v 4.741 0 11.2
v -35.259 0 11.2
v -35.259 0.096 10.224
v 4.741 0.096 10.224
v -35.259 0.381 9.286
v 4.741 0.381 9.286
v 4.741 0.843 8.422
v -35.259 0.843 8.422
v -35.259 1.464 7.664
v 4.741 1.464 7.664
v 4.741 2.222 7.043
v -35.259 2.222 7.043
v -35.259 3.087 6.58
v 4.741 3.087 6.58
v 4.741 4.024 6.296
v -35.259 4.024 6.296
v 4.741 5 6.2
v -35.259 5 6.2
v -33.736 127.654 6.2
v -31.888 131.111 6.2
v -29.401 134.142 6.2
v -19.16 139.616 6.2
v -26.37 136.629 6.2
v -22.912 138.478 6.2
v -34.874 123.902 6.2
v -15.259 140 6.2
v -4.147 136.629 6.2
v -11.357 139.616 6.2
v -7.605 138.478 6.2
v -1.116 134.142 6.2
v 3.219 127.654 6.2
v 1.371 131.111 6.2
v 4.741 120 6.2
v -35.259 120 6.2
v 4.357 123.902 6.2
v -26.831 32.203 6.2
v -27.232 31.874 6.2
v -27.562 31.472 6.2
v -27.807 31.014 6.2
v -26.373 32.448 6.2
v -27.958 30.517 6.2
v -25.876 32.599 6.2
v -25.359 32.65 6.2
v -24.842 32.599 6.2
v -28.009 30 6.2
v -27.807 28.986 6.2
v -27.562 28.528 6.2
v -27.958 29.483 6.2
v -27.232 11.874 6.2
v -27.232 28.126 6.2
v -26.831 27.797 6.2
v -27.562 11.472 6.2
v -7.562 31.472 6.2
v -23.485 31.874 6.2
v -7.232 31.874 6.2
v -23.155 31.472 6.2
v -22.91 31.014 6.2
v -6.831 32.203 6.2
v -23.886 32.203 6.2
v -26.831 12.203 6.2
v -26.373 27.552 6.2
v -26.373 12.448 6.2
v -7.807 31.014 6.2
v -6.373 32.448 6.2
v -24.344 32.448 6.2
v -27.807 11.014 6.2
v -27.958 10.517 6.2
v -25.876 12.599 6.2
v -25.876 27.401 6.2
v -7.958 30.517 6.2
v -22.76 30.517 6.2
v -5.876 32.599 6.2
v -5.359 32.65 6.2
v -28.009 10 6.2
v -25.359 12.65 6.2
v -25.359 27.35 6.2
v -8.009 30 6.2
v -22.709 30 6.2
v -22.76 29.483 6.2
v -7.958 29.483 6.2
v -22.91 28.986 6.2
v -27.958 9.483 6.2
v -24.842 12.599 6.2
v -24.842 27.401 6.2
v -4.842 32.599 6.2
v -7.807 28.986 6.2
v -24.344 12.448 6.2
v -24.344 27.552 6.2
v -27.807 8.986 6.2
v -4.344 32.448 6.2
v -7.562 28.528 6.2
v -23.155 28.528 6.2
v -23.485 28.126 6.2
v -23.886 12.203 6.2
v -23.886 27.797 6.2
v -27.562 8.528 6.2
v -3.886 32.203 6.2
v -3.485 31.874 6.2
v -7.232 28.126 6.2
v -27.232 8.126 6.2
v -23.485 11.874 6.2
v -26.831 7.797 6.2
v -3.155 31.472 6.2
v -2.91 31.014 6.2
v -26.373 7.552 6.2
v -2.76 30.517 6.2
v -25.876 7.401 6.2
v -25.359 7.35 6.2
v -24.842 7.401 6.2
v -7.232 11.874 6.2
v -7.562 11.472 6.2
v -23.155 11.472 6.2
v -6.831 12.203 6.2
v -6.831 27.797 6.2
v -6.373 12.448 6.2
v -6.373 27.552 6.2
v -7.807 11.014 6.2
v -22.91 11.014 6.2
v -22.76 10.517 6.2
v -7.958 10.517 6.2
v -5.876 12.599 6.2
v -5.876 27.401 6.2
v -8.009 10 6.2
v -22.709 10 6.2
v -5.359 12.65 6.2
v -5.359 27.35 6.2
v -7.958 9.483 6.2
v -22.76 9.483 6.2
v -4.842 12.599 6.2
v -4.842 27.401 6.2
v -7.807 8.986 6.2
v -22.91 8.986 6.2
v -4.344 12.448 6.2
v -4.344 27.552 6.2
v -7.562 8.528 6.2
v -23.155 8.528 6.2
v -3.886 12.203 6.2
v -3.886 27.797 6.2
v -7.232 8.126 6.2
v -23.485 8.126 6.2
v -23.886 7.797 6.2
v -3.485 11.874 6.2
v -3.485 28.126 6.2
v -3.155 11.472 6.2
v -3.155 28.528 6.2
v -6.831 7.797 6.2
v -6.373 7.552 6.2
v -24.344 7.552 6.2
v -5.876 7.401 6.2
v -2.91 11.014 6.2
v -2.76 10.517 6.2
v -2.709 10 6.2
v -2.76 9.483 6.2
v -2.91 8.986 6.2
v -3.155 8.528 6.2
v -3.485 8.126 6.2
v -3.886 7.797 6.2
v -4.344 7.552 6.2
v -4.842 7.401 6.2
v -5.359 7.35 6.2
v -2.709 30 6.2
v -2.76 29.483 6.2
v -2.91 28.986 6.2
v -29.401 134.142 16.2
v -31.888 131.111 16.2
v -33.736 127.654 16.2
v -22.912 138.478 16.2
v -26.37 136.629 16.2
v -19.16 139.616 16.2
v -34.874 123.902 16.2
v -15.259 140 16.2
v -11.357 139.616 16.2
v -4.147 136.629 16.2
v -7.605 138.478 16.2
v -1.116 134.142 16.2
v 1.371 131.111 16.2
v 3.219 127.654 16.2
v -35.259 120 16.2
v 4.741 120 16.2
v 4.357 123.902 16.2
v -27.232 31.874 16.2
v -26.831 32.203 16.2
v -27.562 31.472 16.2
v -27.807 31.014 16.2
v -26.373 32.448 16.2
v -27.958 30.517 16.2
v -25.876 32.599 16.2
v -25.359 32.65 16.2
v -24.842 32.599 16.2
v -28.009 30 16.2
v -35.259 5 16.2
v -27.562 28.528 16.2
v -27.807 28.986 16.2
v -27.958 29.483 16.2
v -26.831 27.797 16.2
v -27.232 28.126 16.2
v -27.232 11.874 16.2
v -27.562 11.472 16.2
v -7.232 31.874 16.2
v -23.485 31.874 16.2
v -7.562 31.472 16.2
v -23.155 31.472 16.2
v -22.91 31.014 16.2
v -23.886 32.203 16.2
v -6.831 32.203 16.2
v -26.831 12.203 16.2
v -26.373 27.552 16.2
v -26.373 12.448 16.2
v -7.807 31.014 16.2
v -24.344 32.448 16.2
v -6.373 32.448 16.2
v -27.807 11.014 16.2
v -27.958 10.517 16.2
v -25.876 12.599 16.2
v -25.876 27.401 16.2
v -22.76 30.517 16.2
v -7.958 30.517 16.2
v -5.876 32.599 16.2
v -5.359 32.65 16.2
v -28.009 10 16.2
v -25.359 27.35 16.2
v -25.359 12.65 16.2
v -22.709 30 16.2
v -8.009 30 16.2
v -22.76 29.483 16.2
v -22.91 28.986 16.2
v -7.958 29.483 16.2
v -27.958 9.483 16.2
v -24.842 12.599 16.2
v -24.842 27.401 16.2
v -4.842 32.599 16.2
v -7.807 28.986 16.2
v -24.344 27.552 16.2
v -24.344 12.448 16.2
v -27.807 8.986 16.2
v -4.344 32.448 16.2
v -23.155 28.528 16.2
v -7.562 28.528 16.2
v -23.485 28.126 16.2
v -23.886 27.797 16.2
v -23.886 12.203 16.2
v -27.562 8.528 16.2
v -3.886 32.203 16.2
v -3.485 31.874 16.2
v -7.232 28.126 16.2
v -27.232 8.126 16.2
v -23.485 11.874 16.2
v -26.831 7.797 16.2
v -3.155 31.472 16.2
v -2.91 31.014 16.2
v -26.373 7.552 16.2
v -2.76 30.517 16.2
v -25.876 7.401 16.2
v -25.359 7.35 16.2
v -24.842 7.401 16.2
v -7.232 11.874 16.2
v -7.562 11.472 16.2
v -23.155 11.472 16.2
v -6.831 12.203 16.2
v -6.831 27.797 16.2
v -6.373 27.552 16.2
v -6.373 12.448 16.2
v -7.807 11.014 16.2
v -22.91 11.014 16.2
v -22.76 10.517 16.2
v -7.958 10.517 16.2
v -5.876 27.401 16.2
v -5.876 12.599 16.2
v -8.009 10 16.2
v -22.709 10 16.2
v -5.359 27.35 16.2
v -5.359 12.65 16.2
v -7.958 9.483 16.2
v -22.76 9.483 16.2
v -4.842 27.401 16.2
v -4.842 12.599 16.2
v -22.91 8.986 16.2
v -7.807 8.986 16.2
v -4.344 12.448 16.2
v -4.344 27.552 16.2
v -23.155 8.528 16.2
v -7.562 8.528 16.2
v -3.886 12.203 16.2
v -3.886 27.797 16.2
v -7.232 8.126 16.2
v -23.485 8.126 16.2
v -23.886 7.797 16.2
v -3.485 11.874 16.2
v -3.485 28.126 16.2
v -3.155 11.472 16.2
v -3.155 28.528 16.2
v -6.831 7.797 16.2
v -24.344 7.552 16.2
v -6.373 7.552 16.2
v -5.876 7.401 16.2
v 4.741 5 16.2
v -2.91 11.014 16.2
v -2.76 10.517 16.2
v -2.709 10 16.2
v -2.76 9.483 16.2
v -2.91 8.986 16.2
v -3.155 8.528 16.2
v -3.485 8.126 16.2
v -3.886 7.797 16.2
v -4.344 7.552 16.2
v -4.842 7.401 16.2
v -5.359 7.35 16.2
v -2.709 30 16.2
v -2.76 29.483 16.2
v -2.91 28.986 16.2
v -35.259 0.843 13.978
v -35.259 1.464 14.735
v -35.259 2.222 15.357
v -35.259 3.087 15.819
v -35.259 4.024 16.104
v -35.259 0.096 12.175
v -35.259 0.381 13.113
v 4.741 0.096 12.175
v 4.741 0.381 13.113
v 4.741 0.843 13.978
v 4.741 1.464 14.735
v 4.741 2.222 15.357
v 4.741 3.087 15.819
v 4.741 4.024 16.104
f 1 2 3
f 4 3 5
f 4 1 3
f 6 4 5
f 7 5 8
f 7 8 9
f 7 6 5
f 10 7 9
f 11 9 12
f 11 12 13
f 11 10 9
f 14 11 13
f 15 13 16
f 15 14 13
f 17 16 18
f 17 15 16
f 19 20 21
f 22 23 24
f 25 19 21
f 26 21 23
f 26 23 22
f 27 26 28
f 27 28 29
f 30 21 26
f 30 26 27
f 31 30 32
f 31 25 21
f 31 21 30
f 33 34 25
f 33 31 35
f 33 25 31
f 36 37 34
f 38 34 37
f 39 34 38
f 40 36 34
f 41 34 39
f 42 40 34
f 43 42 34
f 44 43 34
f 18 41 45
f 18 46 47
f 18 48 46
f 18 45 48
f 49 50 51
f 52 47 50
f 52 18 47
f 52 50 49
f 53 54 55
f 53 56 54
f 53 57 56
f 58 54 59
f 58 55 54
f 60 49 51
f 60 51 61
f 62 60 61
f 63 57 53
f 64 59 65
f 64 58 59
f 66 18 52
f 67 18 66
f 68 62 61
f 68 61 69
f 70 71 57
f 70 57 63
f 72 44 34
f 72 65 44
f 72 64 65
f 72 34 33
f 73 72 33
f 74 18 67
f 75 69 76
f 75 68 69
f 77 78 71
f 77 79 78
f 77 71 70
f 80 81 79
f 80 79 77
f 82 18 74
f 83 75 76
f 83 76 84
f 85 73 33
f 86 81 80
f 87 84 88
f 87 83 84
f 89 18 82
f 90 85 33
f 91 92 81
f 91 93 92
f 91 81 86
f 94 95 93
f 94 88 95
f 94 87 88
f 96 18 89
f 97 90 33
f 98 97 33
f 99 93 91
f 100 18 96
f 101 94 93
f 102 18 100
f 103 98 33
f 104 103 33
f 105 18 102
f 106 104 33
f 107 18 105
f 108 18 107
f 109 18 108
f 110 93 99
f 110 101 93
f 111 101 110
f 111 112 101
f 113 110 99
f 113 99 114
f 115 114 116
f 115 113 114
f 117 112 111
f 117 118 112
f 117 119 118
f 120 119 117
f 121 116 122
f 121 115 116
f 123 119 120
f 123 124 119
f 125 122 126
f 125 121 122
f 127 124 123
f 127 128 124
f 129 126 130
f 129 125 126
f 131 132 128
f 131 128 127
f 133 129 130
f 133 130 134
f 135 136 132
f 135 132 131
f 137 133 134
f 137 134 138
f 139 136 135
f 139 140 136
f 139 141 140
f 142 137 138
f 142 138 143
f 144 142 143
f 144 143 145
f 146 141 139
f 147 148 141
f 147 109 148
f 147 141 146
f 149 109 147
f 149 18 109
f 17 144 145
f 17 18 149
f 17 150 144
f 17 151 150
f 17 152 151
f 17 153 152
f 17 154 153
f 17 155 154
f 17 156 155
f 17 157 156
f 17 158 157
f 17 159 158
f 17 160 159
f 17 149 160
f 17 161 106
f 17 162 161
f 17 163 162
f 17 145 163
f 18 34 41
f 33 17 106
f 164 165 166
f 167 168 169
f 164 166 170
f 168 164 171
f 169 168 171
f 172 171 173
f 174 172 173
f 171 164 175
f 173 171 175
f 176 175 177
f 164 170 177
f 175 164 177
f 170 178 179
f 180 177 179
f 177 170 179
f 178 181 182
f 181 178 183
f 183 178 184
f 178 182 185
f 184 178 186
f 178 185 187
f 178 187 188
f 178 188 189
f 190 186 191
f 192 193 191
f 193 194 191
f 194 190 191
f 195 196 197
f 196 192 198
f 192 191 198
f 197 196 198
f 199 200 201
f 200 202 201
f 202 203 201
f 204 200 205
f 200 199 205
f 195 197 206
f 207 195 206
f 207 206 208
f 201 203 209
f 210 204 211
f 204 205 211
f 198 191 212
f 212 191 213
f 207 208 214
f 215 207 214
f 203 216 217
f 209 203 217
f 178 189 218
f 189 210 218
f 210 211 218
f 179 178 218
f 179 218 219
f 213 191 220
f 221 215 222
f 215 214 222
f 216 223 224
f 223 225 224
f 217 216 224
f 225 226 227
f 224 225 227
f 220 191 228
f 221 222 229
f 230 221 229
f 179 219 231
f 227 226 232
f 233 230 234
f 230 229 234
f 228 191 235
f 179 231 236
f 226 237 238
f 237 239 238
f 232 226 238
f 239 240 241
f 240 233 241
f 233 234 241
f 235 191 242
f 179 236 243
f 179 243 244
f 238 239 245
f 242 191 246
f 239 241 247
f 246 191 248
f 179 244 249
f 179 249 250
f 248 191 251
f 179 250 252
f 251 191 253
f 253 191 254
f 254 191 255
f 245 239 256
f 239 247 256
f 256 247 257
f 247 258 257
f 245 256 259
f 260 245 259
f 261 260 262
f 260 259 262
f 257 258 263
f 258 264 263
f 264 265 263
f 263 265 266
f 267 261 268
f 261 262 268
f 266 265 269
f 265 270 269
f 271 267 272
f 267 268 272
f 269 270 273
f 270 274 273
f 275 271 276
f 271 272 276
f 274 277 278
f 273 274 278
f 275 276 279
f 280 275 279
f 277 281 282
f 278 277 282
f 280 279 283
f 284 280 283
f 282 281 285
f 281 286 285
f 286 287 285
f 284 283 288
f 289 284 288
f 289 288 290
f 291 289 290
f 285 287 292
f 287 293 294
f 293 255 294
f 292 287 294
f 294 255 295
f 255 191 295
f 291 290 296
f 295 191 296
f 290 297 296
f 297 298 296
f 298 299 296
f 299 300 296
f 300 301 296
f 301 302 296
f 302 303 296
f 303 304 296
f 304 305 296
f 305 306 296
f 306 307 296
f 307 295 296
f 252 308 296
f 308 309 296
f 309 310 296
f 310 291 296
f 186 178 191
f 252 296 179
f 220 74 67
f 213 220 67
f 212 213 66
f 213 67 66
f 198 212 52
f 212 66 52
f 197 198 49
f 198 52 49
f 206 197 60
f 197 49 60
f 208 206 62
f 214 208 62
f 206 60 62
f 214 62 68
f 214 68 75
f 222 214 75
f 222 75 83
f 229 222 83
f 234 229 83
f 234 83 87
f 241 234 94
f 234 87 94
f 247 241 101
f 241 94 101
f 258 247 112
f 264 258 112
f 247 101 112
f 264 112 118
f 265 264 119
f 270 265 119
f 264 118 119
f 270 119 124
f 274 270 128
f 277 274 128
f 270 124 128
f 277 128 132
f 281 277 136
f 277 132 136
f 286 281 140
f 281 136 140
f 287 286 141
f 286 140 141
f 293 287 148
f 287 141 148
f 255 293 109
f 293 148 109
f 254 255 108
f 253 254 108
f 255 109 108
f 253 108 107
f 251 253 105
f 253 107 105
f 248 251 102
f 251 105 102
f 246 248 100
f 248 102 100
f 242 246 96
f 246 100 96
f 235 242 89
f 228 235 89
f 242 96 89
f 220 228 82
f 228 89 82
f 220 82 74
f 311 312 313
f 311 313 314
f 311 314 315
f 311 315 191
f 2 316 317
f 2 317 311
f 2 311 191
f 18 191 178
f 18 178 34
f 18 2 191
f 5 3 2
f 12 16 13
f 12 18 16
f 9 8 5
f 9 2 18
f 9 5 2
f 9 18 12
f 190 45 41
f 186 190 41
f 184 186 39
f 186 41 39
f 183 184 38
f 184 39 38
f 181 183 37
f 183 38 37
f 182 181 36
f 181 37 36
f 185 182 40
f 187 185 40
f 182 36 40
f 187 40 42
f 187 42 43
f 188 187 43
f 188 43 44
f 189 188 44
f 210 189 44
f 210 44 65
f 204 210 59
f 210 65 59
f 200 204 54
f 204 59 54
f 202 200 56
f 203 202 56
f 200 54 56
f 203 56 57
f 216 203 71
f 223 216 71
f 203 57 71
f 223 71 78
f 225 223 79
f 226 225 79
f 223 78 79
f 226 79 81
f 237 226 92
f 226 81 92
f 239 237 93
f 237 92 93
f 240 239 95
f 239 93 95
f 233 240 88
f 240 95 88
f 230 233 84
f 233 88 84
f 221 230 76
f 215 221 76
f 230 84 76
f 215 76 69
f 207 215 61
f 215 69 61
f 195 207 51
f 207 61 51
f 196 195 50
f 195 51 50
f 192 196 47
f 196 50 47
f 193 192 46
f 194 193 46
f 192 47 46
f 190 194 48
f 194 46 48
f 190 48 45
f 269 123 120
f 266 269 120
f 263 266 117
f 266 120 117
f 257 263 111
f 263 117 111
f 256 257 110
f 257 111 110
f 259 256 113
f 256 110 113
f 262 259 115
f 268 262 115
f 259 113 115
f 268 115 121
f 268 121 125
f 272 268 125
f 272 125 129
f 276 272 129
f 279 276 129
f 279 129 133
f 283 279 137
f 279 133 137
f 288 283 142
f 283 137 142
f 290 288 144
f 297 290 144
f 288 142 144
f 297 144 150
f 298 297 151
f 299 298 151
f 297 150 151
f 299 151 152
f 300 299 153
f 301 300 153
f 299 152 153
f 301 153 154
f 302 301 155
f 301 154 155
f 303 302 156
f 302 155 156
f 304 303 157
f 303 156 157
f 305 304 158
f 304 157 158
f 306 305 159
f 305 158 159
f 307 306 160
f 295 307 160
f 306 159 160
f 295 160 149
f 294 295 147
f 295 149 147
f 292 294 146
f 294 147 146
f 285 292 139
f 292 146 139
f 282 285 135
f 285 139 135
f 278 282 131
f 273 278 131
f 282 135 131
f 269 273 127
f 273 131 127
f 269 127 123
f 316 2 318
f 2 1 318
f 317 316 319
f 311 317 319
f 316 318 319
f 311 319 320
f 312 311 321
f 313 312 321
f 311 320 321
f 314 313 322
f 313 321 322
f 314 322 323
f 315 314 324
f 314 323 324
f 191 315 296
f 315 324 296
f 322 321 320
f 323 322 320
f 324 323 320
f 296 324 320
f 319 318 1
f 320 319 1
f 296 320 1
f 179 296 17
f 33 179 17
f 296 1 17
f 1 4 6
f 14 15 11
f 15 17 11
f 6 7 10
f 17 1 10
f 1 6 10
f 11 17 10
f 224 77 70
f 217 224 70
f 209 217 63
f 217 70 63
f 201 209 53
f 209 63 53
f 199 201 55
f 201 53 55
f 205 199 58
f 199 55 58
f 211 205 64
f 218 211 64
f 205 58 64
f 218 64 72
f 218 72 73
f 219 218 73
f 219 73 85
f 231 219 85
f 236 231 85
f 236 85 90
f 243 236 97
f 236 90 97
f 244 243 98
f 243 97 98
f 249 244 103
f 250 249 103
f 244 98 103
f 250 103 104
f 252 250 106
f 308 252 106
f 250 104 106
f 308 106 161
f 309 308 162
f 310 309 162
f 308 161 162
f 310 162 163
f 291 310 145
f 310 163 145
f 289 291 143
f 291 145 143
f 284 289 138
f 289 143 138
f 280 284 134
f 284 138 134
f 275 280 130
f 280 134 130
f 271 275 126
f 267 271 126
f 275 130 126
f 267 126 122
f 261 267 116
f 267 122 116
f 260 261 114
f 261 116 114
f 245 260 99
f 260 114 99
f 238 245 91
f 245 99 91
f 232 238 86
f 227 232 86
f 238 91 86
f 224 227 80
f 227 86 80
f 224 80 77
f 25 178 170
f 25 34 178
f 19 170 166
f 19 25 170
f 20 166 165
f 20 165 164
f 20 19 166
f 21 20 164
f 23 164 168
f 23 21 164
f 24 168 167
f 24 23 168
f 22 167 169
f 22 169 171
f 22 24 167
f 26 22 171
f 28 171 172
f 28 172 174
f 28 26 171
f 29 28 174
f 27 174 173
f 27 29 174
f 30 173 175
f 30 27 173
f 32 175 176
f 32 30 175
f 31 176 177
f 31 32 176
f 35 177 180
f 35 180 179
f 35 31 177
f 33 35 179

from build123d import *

# Parameters (mm, degrees)
SKETCH1_W           = 40
SKETCH1_H           = 10
BOSS_EXTRUDE1_DEPTH = 140
FILLET4_RADIUS      = 20
FILLET4_LENGTH      = 10
SKETCH2_R           = 2.65
CUT_EXTRUDE1_DEPTH  = 10
FILLET5_R           = 5


with BuildPart() as part:
    # Sketch1 → Boss-Extrude1 (new body)
    with BuildSketch(Plane(origin=(0, 0, 0), x_dir=(1, 0, 0), z_dir=(0, 1, 0))):
        with Locations((-15.258586642, -11.19989116)):
            Rectangle(SKETCH1_W, SKETCH1_H)
    extrude(amount=BOSS_EXTRUDE1_DEPTH)

    # Fillet4: full round fillet: the end face becomes a half cylinder, R = half its width
    fillet4_face = Plane((-15.258586642, 140, 11.19989116), x_dir=(0, 0, -1), z_dir=(0, 1, 0))  # on the end face: x along it, z out of the body
    fillet4_slab = fillet4_face.offset(-FILLET4_RADIUS / 2) * Box(FILLET4_LENGTH, 2 * FILLET4_RADIUS, FILLET4_RADIUS, mode=Mode.PRIVATE)  # the body's end, R deep
    fillet4_round = Plane((-15.258586642, 120, 11.19989116), x_dir=(0, 1, 0), z_dir=(0, 0, -1)) * Cylinder(FILLET4_RADIUS, FILLET4_LENGTH, mode=Mode.PRIVATE)  # its axis R under the face
    add(fillet4_slab - fillet4_round, mode=Mode.SUBTRACT)

    # Sketch2 → Cut-Extrude1 (cut)
    with BuildSketch(Plane(origin=(0, 0, 6.19989116), x_dir=(-1, 0, 0), z_dir=(0, 0, -1))):
        with Locations((5.358586642, 10)):
            Circle(SKETCH2_R)
        with Locations((25.358586642, 10)):
            Circle(SKETCH2_R)
        with Locations((25.358586642, 30)):
            Circle(SKETCH2_R)
        with Locations((5.358586642, 30)):
            Circle(SKETCH2_R)
    extrude(amount=-CUT_EXTRUDE1_DEPTH, mode=Mode.SUBTRACT)

    # Fillet5
    fillet5_edges = [part.edges().sort_by_distance(p)[0] for p in [
        (-15.258586642, 0, 16.19989116),
        (-15.258586642, 0, 6.19989116),
    ]]
    fillet(fillet5_edges, radius=FILLET5_R - 0.0001)  # a hair under: the kernel refuses the full size


solid = part.part
